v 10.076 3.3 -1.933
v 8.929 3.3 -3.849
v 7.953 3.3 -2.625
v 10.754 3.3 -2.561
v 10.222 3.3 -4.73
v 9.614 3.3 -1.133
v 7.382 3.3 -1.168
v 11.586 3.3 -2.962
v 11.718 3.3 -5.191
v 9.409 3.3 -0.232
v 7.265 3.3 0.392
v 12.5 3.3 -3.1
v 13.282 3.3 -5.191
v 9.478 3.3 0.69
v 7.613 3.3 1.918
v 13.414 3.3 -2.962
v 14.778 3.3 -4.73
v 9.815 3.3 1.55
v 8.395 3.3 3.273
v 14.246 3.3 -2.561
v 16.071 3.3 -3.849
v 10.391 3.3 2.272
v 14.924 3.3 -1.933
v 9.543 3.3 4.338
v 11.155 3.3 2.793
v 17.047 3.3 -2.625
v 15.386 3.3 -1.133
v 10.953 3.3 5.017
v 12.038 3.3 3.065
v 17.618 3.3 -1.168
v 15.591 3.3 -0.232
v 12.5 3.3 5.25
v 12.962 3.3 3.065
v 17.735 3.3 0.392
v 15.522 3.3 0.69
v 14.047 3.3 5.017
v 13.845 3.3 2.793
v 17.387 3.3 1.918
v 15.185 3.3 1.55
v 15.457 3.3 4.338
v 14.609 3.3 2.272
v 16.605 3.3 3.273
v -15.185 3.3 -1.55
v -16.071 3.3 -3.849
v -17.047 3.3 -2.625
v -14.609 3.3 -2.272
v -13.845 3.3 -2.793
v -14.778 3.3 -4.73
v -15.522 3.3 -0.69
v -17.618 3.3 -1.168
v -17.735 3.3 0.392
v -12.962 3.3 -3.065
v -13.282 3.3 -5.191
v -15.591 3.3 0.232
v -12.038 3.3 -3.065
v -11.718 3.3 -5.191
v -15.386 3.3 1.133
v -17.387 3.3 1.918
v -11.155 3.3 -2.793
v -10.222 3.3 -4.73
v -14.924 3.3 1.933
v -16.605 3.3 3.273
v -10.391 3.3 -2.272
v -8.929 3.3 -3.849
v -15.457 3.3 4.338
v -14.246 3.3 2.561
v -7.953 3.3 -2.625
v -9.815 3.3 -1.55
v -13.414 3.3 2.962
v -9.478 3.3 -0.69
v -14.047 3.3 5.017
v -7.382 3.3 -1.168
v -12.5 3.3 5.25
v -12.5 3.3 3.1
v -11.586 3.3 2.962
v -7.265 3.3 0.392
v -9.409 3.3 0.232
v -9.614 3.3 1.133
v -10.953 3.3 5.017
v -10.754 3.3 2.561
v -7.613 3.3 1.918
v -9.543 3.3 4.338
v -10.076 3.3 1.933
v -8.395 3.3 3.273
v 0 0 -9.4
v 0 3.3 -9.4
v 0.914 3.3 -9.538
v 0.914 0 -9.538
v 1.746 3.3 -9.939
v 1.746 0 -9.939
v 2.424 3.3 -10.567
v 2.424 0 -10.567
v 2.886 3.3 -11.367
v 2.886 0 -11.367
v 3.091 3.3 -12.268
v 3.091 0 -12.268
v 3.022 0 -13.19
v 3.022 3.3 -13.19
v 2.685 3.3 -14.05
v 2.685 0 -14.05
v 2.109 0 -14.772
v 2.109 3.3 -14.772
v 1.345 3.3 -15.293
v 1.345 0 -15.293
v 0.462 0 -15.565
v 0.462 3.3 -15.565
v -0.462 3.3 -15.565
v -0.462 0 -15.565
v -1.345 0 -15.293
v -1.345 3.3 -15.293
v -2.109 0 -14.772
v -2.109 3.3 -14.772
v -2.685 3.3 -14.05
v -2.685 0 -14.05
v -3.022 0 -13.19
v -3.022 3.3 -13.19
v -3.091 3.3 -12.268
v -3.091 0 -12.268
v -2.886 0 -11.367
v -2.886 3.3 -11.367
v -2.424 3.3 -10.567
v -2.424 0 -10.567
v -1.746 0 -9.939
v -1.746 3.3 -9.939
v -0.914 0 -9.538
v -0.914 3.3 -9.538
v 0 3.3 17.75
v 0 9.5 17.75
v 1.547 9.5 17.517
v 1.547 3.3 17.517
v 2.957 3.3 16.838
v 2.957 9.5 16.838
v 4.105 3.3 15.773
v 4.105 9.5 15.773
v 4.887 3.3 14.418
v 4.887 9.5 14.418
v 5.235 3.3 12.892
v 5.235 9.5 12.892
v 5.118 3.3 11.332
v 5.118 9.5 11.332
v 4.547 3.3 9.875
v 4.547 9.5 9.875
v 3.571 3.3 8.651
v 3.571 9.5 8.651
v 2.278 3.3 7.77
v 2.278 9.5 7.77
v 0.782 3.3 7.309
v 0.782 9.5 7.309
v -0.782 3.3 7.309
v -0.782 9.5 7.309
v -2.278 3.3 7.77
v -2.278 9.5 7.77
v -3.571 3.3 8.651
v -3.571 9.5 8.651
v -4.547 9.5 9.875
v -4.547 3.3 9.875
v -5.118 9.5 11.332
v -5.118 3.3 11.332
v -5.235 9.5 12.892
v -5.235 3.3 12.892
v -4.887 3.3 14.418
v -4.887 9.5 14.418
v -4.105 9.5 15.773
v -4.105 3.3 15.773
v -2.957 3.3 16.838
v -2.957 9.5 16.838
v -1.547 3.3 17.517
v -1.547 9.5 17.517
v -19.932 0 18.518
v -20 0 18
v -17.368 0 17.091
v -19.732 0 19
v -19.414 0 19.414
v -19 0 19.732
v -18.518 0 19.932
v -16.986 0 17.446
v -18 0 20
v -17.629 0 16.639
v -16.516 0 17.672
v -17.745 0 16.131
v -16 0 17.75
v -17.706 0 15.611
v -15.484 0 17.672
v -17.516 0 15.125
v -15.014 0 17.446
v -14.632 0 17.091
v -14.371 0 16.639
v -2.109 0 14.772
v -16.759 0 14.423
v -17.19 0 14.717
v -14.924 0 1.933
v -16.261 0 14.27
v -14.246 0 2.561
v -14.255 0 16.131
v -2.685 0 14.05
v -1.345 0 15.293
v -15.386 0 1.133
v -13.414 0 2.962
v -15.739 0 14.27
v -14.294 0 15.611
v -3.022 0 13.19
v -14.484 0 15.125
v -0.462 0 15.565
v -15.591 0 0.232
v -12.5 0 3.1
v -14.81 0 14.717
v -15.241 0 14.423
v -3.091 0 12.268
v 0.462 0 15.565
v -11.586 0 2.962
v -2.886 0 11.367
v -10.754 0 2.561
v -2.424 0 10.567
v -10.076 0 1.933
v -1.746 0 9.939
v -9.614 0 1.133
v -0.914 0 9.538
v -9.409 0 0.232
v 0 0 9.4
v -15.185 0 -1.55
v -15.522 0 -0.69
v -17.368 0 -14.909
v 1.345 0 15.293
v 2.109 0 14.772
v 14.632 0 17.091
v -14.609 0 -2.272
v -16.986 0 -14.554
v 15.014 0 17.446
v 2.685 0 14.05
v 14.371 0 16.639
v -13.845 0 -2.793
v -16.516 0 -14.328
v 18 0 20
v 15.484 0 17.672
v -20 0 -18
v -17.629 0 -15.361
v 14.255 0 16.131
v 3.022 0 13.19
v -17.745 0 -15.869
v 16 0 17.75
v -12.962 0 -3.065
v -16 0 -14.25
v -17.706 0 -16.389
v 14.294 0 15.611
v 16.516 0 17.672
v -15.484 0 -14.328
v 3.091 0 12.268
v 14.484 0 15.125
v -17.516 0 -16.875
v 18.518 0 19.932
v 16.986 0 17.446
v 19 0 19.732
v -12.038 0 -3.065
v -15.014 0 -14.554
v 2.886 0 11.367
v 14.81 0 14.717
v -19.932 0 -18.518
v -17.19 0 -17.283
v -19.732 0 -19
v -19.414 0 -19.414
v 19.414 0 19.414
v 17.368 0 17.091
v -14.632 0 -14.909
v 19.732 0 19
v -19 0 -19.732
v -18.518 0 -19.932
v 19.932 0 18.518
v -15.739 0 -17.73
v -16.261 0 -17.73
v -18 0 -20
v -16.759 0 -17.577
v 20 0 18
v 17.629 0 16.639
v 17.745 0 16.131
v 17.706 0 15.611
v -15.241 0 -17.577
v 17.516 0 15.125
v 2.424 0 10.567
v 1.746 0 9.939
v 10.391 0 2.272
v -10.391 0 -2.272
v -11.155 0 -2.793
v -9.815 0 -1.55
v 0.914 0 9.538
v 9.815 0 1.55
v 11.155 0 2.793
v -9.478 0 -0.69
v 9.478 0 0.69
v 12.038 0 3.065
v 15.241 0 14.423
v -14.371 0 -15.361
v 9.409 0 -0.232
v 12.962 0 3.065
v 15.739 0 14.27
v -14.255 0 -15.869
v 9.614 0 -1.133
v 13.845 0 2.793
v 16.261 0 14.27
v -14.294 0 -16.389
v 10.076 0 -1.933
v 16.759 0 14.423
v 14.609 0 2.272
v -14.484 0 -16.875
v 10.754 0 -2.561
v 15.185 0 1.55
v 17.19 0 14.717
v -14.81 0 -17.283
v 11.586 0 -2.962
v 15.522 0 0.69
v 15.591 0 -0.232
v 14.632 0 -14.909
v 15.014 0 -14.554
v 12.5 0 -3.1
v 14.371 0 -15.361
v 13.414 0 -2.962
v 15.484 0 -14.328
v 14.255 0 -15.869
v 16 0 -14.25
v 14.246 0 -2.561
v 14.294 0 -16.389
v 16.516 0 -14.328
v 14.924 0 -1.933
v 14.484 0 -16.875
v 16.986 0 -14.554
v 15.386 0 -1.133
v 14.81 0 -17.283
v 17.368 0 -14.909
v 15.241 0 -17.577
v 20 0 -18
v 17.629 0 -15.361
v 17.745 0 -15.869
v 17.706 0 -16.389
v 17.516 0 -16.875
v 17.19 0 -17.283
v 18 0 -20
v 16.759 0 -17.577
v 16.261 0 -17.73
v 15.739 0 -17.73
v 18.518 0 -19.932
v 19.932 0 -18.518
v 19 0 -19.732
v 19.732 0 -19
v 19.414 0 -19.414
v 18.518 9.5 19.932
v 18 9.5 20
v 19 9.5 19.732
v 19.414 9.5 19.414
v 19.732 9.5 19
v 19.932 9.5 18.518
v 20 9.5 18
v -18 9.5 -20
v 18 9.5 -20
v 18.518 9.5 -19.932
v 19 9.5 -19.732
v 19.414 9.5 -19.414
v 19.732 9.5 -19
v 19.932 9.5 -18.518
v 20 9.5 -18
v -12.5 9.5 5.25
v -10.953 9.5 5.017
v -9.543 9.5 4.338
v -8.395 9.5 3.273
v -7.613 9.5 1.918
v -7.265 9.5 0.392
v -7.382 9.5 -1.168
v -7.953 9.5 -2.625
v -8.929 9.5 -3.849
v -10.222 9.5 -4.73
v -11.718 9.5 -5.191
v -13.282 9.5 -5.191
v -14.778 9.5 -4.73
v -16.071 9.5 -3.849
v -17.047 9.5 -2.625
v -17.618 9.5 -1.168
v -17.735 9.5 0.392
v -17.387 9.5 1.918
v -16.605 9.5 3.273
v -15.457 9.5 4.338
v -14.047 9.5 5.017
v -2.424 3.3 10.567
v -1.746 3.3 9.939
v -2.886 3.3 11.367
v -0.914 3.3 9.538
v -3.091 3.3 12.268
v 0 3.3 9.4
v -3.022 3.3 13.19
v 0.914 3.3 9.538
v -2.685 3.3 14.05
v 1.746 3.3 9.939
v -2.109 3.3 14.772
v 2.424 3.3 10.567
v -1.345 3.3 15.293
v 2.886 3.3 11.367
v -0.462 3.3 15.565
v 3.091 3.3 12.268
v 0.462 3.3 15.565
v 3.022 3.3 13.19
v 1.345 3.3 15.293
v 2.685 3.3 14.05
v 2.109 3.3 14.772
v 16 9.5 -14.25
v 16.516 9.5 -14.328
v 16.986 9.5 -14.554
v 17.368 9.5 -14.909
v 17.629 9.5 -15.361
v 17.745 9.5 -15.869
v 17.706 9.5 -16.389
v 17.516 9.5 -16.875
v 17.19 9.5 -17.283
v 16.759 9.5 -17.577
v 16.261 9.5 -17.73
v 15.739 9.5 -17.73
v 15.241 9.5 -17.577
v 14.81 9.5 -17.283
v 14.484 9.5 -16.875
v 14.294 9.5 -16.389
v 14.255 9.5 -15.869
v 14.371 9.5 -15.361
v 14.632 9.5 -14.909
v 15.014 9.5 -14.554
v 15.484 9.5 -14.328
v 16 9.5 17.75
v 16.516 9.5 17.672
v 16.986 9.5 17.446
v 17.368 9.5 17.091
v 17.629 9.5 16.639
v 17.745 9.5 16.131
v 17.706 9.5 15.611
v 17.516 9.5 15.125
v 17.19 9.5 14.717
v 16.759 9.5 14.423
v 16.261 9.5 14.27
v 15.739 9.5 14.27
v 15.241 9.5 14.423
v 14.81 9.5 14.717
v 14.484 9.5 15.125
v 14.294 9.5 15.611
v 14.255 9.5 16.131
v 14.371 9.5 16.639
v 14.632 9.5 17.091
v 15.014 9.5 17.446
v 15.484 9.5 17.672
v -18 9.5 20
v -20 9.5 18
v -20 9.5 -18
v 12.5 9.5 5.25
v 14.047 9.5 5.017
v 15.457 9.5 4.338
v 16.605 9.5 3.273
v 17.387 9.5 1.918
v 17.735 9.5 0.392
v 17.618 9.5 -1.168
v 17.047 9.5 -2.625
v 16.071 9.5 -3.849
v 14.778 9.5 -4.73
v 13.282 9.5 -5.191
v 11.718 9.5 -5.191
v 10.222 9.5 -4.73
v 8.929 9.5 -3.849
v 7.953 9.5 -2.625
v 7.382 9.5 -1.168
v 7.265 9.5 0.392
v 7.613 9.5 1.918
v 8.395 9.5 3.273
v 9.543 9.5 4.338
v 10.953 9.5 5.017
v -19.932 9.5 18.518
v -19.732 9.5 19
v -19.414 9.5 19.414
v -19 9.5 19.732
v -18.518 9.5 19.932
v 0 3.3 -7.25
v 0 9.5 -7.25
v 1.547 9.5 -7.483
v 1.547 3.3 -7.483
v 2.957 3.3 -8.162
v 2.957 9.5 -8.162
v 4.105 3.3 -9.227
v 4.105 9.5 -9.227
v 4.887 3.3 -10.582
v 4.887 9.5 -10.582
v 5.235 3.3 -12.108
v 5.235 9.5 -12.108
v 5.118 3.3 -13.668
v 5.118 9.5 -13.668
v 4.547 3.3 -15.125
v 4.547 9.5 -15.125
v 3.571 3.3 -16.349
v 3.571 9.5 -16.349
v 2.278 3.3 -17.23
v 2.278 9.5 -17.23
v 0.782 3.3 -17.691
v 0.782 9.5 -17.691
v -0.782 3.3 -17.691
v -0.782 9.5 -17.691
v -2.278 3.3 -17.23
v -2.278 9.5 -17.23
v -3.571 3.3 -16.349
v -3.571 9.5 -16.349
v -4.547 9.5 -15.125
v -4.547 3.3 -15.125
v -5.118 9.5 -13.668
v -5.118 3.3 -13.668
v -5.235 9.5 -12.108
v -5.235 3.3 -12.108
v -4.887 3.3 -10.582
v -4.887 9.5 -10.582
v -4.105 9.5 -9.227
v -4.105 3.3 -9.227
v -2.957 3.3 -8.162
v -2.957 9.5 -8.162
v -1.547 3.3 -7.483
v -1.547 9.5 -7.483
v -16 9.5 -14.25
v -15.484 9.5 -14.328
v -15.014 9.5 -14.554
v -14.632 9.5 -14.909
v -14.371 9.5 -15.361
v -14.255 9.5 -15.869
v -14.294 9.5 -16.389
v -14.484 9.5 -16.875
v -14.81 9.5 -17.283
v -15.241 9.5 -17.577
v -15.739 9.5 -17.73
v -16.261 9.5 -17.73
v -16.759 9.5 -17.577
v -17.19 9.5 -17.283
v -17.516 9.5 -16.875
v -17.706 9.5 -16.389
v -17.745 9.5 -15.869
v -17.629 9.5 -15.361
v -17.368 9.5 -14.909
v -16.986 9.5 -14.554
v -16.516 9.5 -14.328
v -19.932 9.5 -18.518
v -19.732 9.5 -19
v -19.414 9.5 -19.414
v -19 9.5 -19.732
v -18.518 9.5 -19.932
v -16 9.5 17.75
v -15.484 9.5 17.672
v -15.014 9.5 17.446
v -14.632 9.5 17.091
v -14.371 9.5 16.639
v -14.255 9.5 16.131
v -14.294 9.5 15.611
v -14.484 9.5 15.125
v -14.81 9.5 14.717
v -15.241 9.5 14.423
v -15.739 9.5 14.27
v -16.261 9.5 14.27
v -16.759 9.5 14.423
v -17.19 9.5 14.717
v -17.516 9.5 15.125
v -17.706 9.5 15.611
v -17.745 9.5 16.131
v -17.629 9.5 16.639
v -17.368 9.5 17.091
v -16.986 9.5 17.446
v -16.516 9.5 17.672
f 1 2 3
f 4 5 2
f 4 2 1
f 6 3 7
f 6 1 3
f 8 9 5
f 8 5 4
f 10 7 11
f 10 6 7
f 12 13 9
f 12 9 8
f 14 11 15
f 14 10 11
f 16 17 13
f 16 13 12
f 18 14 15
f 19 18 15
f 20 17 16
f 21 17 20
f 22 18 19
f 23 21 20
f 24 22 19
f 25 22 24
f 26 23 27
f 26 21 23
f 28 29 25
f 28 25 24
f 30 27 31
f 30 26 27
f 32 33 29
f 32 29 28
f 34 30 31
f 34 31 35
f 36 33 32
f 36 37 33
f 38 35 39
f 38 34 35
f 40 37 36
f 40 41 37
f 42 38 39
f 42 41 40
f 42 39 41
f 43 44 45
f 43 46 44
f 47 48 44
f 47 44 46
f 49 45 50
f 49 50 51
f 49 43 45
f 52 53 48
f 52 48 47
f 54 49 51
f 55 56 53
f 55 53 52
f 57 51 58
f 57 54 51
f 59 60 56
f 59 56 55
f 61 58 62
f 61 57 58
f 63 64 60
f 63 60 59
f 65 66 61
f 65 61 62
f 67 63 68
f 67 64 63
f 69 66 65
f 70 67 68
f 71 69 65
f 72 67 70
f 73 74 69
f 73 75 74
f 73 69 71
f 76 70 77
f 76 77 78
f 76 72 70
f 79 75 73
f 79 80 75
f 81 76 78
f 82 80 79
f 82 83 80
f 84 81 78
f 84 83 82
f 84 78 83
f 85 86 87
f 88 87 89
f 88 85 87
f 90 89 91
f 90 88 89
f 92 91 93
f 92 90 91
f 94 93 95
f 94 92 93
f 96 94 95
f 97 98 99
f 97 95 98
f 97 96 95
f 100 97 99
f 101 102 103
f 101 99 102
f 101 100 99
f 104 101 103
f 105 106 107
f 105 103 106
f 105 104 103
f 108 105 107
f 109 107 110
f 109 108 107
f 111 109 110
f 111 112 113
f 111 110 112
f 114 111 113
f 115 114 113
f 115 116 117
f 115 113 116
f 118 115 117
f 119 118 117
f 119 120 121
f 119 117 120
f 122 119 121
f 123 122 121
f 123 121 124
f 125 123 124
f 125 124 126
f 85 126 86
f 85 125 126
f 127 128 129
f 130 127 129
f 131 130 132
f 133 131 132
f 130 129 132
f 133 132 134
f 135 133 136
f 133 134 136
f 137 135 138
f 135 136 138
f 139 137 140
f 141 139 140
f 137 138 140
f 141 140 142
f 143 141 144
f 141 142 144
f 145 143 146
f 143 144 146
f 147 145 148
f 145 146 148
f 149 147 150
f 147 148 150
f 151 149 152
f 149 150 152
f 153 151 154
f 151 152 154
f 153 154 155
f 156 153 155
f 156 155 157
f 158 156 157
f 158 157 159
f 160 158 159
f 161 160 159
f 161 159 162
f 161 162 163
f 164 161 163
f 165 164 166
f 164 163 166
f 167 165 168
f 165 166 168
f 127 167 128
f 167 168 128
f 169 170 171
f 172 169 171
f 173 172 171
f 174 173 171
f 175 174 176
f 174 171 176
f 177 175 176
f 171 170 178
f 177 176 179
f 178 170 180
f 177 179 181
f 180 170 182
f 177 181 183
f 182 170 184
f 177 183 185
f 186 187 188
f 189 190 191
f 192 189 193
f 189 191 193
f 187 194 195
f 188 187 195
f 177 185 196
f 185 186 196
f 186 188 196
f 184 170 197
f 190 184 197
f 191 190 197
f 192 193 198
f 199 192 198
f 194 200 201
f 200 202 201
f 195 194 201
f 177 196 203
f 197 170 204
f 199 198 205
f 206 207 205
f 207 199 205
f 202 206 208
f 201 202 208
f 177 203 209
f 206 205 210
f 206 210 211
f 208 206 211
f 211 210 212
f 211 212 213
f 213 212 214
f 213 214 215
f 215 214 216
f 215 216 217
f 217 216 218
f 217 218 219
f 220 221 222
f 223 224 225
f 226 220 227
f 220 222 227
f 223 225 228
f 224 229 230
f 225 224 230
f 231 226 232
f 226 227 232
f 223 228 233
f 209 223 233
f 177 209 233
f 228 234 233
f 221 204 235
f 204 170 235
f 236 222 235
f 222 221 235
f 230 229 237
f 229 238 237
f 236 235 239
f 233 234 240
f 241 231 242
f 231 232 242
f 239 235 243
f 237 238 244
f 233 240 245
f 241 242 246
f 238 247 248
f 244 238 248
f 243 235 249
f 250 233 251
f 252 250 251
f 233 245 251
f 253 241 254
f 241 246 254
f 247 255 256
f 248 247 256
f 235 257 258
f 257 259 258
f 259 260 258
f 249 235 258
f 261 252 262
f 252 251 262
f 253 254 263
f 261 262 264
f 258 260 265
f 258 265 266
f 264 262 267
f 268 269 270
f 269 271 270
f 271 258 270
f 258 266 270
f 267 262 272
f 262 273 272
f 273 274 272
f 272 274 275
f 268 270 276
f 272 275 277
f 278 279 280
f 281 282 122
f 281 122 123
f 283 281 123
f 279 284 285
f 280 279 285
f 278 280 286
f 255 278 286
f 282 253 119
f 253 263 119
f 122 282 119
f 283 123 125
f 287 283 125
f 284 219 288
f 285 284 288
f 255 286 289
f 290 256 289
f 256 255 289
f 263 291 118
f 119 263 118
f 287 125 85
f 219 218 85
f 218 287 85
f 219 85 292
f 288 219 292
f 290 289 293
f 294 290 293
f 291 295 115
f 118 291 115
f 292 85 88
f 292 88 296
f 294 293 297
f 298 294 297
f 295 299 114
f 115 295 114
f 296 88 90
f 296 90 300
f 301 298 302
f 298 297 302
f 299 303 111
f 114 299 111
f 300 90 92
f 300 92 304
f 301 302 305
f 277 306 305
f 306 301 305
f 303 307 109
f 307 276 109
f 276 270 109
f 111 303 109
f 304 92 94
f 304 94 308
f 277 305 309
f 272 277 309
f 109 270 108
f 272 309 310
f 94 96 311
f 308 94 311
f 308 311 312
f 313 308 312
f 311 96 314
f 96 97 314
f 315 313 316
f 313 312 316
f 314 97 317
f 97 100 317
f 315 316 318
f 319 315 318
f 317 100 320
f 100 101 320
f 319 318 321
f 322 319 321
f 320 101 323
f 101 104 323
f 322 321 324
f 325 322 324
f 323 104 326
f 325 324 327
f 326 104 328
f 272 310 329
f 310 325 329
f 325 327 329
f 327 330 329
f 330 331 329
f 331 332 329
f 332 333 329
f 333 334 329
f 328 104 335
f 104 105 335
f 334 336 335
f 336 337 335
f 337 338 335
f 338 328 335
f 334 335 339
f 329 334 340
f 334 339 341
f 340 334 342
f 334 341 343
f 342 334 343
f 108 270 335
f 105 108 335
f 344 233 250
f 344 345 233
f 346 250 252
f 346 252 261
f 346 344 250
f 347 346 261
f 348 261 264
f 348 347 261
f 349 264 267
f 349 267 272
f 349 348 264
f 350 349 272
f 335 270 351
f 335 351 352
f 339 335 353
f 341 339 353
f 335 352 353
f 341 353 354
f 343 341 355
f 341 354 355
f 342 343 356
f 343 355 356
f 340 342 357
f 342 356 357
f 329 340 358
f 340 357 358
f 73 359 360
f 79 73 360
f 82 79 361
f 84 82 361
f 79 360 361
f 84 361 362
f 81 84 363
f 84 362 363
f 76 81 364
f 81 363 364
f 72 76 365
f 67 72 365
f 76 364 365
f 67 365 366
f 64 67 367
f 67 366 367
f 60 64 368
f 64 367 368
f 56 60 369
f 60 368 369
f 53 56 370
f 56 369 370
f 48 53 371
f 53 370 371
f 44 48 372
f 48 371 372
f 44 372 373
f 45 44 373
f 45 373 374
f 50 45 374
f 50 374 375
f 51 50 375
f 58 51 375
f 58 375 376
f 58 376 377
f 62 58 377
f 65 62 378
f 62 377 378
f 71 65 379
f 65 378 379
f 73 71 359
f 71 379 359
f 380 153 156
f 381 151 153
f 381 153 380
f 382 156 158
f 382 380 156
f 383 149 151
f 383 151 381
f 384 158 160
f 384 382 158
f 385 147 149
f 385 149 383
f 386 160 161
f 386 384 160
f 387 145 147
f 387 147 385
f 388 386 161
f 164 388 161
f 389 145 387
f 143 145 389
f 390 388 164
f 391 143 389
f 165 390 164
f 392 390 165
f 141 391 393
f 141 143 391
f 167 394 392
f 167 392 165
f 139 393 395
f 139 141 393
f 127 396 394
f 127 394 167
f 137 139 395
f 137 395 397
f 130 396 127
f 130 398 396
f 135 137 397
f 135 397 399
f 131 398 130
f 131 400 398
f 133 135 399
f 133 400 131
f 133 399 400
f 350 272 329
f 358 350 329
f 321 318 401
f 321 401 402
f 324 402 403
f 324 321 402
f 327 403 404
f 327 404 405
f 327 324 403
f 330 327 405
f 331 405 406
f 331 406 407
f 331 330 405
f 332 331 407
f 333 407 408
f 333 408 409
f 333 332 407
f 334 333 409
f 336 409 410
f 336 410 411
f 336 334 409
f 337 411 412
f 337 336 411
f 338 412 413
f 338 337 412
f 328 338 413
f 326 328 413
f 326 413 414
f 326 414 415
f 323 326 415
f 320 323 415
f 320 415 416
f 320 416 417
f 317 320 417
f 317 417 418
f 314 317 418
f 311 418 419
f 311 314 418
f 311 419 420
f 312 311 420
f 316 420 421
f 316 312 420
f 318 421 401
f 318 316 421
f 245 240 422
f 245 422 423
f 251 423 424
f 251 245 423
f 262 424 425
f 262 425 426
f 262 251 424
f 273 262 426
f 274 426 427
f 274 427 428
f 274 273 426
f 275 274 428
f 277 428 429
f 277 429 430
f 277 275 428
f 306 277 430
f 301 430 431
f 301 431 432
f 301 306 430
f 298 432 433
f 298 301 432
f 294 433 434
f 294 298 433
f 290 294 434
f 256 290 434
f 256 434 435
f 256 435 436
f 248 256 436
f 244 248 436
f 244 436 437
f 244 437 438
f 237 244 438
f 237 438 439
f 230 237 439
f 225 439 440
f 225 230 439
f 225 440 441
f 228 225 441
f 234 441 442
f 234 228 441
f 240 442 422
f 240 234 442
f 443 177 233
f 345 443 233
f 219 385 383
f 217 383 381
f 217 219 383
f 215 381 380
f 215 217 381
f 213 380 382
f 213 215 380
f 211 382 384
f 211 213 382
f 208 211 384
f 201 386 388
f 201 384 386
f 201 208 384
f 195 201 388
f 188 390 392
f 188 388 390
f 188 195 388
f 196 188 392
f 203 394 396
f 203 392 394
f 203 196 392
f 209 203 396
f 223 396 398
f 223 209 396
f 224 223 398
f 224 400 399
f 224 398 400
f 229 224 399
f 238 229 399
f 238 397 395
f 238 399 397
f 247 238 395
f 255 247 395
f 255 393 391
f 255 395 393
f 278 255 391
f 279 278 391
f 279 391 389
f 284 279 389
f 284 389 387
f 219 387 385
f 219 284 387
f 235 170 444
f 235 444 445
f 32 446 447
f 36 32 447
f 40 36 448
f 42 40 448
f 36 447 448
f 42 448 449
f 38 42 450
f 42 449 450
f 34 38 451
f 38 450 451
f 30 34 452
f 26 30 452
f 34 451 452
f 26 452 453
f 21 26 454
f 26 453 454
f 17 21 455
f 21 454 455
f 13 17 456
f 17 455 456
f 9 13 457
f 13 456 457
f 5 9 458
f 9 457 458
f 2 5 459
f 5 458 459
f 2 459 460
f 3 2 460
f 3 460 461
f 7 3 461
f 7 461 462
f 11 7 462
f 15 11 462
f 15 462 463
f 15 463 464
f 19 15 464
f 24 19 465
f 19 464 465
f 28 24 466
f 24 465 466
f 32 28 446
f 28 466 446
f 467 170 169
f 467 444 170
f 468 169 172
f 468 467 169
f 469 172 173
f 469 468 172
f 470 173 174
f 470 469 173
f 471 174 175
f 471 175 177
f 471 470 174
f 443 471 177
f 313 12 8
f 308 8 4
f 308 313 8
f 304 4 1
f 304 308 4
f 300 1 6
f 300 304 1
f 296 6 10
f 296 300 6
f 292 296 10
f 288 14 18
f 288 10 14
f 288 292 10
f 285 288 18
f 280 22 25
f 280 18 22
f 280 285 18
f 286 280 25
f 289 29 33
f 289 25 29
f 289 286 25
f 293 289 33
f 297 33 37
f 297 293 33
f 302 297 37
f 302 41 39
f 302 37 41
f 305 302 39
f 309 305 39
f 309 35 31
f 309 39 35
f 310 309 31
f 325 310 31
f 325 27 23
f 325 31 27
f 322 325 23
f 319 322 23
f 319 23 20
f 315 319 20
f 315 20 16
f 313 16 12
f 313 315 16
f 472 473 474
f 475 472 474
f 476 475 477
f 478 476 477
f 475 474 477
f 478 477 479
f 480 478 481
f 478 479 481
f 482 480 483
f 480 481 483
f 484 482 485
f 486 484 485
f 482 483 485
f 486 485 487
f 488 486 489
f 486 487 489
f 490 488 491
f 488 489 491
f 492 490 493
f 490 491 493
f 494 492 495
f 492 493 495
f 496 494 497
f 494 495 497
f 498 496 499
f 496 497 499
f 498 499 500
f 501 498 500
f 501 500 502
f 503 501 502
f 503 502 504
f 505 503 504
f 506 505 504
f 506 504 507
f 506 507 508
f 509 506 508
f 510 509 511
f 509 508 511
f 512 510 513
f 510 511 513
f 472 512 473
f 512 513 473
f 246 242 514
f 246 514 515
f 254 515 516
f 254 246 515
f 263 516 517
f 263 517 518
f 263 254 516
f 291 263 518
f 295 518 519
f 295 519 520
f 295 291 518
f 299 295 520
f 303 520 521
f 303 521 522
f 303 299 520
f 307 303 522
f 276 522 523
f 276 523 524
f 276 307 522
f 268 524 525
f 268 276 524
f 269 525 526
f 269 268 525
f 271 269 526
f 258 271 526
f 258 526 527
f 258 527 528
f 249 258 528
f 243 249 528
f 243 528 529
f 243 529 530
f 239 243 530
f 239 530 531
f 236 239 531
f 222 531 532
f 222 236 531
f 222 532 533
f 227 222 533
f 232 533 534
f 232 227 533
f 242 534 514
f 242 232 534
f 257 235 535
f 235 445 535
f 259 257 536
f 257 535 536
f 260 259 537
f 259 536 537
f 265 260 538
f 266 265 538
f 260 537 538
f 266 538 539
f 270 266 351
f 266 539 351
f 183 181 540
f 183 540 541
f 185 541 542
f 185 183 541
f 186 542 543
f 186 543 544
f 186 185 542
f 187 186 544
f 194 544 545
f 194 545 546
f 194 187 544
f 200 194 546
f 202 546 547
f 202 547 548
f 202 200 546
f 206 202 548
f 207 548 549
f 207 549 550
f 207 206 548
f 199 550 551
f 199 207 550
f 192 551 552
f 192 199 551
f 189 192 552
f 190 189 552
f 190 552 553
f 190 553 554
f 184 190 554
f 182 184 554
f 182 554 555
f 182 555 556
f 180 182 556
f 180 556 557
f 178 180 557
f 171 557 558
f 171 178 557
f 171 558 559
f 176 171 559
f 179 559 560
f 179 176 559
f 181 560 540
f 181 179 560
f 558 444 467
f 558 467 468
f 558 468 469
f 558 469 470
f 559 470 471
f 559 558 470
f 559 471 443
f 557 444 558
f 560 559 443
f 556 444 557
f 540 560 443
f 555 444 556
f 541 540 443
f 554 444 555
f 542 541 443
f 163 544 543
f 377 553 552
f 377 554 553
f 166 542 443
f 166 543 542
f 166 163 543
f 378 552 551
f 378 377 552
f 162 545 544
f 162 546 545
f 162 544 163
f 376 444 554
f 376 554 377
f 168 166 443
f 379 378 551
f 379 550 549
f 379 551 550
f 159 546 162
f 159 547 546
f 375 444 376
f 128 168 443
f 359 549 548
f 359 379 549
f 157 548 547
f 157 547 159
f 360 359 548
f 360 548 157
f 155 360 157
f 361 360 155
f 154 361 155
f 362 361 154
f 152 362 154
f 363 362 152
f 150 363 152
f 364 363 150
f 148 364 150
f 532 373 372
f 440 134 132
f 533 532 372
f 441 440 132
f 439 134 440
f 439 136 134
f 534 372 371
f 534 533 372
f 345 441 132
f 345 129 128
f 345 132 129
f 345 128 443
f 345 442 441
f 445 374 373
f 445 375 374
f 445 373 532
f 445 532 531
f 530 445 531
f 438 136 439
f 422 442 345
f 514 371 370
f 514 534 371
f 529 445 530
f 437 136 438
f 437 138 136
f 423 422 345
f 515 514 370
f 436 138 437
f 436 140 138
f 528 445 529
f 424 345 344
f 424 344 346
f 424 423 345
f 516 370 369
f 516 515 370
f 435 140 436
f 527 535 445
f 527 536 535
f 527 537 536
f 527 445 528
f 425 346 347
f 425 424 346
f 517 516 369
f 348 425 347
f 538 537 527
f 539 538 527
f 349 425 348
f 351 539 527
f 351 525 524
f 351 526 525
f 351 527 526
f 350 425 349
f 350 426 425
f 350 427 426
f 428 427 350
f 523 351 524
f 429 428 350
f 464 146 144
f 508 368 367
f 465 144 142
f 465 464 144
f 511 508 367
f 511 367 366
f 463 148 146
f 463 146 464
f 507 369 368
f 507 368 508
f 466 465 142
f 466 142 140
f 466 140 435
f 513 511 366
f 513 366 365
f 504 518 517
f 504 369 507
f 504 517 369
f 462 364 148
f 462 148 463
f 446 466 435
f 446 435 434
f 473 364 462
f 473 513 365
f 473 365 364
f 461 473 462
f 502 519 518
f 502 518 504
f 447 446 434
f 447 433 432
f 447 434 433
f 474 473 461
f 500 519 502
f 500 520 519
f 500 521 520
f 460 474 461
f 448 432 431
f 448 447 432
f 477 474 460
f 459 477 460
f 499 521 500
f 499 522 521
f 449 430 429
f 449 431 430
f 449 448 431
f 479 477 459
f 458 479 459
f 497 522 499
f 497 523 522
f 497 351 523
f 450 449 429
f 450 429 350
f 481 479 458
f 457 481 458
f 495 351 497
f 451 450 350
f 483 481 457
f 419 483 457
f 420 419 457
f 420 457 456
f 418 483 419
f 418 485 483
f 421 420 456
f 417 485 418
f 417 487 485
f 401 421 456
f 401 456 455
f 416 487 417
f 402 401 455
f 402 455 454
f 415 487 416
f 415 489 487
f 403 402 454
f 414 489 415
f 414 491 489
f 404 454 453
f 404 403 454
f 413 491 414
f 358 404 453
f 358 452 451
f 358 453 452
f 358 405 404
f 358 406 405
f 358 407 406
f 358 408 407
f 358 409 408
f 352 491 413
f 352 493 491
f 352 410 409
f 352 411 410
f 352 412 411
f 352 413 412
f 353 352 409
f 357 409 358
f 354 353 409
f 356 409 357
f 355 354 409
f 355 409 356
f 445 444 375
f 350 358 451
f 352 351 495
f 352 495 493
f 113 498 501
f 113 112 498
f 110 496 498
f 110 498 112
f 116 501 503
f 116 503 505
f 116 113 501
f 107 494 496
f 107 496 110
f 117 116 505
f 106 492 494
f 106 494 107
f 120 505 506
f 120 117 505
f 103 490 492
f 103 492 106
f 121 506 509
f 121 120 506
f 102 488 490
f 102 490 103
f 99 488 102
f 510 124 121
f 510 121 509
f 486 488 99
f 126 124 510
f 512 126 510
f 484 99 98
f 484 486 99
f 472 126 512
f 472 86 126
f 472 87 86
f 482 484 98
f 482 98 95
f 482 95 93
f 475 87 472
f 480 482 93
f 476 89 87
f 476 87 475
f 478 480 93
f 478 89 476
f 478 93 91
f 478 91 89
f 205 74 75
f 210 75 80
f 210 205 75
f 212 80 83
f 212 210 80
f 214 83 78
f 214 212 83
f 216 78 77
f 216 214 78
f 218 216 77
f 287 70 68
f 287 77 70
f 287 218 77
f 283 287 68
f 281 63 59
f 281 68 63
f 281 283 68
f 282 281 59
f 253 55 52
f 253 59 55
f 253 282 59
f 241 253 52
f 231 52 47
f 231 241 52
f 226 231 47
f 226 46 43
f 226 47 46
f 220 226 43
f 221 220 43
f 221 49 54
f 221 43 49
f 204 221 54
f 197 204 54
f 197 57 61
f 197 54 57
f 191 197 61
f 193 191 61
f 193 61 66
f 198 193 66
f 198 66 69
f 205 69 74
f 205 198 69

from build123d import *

# Parameters (mm, degrees)
SKETCH_1_W          = 40
SKETCH_1_H          = 40
SKETCH_1_R          = 1.75
SKETCH_1_R_2        = 3.1
EXTRUDE_1_DEPTH     = 9.5
FILLET_1_R          = 2
SKETCH_2_R          = 5.25
CUT_EXTRUDE_1_DEPTH = 6.2


with BuildPart() as part:
    # 草图1 → 凸台-拉伸1 (new body)
    with BuildSketch(Plane(origin=(0, 0, 0), x_dir=(1, 0, 0), z_dir=(0, 1, 0))):
        Rectangle(SKETCH_1_W, SKETCH_1_H)
        with Locations(Location((-16, 16, 0), (0, 0, 270))):  # turned: the seam where the file's is
            Circle(SKETCH_1_R, mode=Mode.SUBTRACT)
        with Locations(Location((16, 16, 0), (0, 0, 270))):  # turned: the seam where the file's is
            Circle(SKETCH_1_R, mode=Mode.SUBTRACT)
        with Locations(Location((-16, -16, 0), (0, 0, 270))):  # turned: the seam where the file's is
            Circle(SKETCH_1_R, mode=Mode.SUBTRACT)
        with Locations(Location((16, -16, 0), (0, 0, 270))):  # turned: the seam where the file's is
            Circle(SKETCH_1_R, mode=Mode.SUBTRACT)
        with Locations(Location((-12.5, 0, 0), (0, 0, 270))):  # turned: the seam where the file's is
            Circle(SKETCH_1_R_2, mode=Mode.SUBTRACT)
        with Locations(Location((12.5, 0, 0), (0, 0, 90))):  # turned: the seam where the file's is
            Circle(SKETCH_1_R_2, mode=Mode.SUBTRACT)
        with Locations(Location((0, 12.5, 0), (0, 0, 270))):  # turned: the seam where the file's is
            Circle(SKETCH_1_R_2, mode=Mode.SUBTRACT)
        with Locations(Location((0, -12.5, 0), (0, 0, 90))):  # turned: the seam where the file's is
            Circle(SKETCH_1_R_2, mode=Mode.SUBTRACT)
    extrude(amount=EXTRUDE_1_DEPTH)

    # 圆角1
    fillet_1_edges = [part.edges().sort_by_distance(p)[0] for p in [
        (20, 4.75, 20),
        (-20, 4.75, 20),
        (-20, 4.75, -20),
        (20, 4.75, -20),
    ]]
    fillet(fillet_1_edges, radius=FILLET_1_R)

    # 草图2 → 切除-拉伸1 (cut)
    with BuildSketch(Plane(origin=(0, 9.5, 0), x_dir=(1, 0, 0), z_dir=(0, 1, 0))):
        with Locations(Location((0, 12.5, 0), (0, 0, 270))):  # turned: the seam where the file's is
            Circle(SKETCH_2_R)
        with Locations(Location((12.5, 0, 0), (0, 0, 270))):  # turned: the seam where the file's is
            Circle(SKETCH_2_R)
        with Locations(Location((0, -12.5, 0), (0, 0, 270))):  # turned: the seam where the file's is
            Circle(SKETCH_2_R)
        with Locations(Location((-12.5, 0, 0), (0, 0, 270))):  # turned: the seam where the file's is
            Circle(SKETCH_2_R)
    extrude(amount=-CUT_EXTRUDE_1_DEPTH, mode=Mode.SUBTRACT)


solid = part.part
